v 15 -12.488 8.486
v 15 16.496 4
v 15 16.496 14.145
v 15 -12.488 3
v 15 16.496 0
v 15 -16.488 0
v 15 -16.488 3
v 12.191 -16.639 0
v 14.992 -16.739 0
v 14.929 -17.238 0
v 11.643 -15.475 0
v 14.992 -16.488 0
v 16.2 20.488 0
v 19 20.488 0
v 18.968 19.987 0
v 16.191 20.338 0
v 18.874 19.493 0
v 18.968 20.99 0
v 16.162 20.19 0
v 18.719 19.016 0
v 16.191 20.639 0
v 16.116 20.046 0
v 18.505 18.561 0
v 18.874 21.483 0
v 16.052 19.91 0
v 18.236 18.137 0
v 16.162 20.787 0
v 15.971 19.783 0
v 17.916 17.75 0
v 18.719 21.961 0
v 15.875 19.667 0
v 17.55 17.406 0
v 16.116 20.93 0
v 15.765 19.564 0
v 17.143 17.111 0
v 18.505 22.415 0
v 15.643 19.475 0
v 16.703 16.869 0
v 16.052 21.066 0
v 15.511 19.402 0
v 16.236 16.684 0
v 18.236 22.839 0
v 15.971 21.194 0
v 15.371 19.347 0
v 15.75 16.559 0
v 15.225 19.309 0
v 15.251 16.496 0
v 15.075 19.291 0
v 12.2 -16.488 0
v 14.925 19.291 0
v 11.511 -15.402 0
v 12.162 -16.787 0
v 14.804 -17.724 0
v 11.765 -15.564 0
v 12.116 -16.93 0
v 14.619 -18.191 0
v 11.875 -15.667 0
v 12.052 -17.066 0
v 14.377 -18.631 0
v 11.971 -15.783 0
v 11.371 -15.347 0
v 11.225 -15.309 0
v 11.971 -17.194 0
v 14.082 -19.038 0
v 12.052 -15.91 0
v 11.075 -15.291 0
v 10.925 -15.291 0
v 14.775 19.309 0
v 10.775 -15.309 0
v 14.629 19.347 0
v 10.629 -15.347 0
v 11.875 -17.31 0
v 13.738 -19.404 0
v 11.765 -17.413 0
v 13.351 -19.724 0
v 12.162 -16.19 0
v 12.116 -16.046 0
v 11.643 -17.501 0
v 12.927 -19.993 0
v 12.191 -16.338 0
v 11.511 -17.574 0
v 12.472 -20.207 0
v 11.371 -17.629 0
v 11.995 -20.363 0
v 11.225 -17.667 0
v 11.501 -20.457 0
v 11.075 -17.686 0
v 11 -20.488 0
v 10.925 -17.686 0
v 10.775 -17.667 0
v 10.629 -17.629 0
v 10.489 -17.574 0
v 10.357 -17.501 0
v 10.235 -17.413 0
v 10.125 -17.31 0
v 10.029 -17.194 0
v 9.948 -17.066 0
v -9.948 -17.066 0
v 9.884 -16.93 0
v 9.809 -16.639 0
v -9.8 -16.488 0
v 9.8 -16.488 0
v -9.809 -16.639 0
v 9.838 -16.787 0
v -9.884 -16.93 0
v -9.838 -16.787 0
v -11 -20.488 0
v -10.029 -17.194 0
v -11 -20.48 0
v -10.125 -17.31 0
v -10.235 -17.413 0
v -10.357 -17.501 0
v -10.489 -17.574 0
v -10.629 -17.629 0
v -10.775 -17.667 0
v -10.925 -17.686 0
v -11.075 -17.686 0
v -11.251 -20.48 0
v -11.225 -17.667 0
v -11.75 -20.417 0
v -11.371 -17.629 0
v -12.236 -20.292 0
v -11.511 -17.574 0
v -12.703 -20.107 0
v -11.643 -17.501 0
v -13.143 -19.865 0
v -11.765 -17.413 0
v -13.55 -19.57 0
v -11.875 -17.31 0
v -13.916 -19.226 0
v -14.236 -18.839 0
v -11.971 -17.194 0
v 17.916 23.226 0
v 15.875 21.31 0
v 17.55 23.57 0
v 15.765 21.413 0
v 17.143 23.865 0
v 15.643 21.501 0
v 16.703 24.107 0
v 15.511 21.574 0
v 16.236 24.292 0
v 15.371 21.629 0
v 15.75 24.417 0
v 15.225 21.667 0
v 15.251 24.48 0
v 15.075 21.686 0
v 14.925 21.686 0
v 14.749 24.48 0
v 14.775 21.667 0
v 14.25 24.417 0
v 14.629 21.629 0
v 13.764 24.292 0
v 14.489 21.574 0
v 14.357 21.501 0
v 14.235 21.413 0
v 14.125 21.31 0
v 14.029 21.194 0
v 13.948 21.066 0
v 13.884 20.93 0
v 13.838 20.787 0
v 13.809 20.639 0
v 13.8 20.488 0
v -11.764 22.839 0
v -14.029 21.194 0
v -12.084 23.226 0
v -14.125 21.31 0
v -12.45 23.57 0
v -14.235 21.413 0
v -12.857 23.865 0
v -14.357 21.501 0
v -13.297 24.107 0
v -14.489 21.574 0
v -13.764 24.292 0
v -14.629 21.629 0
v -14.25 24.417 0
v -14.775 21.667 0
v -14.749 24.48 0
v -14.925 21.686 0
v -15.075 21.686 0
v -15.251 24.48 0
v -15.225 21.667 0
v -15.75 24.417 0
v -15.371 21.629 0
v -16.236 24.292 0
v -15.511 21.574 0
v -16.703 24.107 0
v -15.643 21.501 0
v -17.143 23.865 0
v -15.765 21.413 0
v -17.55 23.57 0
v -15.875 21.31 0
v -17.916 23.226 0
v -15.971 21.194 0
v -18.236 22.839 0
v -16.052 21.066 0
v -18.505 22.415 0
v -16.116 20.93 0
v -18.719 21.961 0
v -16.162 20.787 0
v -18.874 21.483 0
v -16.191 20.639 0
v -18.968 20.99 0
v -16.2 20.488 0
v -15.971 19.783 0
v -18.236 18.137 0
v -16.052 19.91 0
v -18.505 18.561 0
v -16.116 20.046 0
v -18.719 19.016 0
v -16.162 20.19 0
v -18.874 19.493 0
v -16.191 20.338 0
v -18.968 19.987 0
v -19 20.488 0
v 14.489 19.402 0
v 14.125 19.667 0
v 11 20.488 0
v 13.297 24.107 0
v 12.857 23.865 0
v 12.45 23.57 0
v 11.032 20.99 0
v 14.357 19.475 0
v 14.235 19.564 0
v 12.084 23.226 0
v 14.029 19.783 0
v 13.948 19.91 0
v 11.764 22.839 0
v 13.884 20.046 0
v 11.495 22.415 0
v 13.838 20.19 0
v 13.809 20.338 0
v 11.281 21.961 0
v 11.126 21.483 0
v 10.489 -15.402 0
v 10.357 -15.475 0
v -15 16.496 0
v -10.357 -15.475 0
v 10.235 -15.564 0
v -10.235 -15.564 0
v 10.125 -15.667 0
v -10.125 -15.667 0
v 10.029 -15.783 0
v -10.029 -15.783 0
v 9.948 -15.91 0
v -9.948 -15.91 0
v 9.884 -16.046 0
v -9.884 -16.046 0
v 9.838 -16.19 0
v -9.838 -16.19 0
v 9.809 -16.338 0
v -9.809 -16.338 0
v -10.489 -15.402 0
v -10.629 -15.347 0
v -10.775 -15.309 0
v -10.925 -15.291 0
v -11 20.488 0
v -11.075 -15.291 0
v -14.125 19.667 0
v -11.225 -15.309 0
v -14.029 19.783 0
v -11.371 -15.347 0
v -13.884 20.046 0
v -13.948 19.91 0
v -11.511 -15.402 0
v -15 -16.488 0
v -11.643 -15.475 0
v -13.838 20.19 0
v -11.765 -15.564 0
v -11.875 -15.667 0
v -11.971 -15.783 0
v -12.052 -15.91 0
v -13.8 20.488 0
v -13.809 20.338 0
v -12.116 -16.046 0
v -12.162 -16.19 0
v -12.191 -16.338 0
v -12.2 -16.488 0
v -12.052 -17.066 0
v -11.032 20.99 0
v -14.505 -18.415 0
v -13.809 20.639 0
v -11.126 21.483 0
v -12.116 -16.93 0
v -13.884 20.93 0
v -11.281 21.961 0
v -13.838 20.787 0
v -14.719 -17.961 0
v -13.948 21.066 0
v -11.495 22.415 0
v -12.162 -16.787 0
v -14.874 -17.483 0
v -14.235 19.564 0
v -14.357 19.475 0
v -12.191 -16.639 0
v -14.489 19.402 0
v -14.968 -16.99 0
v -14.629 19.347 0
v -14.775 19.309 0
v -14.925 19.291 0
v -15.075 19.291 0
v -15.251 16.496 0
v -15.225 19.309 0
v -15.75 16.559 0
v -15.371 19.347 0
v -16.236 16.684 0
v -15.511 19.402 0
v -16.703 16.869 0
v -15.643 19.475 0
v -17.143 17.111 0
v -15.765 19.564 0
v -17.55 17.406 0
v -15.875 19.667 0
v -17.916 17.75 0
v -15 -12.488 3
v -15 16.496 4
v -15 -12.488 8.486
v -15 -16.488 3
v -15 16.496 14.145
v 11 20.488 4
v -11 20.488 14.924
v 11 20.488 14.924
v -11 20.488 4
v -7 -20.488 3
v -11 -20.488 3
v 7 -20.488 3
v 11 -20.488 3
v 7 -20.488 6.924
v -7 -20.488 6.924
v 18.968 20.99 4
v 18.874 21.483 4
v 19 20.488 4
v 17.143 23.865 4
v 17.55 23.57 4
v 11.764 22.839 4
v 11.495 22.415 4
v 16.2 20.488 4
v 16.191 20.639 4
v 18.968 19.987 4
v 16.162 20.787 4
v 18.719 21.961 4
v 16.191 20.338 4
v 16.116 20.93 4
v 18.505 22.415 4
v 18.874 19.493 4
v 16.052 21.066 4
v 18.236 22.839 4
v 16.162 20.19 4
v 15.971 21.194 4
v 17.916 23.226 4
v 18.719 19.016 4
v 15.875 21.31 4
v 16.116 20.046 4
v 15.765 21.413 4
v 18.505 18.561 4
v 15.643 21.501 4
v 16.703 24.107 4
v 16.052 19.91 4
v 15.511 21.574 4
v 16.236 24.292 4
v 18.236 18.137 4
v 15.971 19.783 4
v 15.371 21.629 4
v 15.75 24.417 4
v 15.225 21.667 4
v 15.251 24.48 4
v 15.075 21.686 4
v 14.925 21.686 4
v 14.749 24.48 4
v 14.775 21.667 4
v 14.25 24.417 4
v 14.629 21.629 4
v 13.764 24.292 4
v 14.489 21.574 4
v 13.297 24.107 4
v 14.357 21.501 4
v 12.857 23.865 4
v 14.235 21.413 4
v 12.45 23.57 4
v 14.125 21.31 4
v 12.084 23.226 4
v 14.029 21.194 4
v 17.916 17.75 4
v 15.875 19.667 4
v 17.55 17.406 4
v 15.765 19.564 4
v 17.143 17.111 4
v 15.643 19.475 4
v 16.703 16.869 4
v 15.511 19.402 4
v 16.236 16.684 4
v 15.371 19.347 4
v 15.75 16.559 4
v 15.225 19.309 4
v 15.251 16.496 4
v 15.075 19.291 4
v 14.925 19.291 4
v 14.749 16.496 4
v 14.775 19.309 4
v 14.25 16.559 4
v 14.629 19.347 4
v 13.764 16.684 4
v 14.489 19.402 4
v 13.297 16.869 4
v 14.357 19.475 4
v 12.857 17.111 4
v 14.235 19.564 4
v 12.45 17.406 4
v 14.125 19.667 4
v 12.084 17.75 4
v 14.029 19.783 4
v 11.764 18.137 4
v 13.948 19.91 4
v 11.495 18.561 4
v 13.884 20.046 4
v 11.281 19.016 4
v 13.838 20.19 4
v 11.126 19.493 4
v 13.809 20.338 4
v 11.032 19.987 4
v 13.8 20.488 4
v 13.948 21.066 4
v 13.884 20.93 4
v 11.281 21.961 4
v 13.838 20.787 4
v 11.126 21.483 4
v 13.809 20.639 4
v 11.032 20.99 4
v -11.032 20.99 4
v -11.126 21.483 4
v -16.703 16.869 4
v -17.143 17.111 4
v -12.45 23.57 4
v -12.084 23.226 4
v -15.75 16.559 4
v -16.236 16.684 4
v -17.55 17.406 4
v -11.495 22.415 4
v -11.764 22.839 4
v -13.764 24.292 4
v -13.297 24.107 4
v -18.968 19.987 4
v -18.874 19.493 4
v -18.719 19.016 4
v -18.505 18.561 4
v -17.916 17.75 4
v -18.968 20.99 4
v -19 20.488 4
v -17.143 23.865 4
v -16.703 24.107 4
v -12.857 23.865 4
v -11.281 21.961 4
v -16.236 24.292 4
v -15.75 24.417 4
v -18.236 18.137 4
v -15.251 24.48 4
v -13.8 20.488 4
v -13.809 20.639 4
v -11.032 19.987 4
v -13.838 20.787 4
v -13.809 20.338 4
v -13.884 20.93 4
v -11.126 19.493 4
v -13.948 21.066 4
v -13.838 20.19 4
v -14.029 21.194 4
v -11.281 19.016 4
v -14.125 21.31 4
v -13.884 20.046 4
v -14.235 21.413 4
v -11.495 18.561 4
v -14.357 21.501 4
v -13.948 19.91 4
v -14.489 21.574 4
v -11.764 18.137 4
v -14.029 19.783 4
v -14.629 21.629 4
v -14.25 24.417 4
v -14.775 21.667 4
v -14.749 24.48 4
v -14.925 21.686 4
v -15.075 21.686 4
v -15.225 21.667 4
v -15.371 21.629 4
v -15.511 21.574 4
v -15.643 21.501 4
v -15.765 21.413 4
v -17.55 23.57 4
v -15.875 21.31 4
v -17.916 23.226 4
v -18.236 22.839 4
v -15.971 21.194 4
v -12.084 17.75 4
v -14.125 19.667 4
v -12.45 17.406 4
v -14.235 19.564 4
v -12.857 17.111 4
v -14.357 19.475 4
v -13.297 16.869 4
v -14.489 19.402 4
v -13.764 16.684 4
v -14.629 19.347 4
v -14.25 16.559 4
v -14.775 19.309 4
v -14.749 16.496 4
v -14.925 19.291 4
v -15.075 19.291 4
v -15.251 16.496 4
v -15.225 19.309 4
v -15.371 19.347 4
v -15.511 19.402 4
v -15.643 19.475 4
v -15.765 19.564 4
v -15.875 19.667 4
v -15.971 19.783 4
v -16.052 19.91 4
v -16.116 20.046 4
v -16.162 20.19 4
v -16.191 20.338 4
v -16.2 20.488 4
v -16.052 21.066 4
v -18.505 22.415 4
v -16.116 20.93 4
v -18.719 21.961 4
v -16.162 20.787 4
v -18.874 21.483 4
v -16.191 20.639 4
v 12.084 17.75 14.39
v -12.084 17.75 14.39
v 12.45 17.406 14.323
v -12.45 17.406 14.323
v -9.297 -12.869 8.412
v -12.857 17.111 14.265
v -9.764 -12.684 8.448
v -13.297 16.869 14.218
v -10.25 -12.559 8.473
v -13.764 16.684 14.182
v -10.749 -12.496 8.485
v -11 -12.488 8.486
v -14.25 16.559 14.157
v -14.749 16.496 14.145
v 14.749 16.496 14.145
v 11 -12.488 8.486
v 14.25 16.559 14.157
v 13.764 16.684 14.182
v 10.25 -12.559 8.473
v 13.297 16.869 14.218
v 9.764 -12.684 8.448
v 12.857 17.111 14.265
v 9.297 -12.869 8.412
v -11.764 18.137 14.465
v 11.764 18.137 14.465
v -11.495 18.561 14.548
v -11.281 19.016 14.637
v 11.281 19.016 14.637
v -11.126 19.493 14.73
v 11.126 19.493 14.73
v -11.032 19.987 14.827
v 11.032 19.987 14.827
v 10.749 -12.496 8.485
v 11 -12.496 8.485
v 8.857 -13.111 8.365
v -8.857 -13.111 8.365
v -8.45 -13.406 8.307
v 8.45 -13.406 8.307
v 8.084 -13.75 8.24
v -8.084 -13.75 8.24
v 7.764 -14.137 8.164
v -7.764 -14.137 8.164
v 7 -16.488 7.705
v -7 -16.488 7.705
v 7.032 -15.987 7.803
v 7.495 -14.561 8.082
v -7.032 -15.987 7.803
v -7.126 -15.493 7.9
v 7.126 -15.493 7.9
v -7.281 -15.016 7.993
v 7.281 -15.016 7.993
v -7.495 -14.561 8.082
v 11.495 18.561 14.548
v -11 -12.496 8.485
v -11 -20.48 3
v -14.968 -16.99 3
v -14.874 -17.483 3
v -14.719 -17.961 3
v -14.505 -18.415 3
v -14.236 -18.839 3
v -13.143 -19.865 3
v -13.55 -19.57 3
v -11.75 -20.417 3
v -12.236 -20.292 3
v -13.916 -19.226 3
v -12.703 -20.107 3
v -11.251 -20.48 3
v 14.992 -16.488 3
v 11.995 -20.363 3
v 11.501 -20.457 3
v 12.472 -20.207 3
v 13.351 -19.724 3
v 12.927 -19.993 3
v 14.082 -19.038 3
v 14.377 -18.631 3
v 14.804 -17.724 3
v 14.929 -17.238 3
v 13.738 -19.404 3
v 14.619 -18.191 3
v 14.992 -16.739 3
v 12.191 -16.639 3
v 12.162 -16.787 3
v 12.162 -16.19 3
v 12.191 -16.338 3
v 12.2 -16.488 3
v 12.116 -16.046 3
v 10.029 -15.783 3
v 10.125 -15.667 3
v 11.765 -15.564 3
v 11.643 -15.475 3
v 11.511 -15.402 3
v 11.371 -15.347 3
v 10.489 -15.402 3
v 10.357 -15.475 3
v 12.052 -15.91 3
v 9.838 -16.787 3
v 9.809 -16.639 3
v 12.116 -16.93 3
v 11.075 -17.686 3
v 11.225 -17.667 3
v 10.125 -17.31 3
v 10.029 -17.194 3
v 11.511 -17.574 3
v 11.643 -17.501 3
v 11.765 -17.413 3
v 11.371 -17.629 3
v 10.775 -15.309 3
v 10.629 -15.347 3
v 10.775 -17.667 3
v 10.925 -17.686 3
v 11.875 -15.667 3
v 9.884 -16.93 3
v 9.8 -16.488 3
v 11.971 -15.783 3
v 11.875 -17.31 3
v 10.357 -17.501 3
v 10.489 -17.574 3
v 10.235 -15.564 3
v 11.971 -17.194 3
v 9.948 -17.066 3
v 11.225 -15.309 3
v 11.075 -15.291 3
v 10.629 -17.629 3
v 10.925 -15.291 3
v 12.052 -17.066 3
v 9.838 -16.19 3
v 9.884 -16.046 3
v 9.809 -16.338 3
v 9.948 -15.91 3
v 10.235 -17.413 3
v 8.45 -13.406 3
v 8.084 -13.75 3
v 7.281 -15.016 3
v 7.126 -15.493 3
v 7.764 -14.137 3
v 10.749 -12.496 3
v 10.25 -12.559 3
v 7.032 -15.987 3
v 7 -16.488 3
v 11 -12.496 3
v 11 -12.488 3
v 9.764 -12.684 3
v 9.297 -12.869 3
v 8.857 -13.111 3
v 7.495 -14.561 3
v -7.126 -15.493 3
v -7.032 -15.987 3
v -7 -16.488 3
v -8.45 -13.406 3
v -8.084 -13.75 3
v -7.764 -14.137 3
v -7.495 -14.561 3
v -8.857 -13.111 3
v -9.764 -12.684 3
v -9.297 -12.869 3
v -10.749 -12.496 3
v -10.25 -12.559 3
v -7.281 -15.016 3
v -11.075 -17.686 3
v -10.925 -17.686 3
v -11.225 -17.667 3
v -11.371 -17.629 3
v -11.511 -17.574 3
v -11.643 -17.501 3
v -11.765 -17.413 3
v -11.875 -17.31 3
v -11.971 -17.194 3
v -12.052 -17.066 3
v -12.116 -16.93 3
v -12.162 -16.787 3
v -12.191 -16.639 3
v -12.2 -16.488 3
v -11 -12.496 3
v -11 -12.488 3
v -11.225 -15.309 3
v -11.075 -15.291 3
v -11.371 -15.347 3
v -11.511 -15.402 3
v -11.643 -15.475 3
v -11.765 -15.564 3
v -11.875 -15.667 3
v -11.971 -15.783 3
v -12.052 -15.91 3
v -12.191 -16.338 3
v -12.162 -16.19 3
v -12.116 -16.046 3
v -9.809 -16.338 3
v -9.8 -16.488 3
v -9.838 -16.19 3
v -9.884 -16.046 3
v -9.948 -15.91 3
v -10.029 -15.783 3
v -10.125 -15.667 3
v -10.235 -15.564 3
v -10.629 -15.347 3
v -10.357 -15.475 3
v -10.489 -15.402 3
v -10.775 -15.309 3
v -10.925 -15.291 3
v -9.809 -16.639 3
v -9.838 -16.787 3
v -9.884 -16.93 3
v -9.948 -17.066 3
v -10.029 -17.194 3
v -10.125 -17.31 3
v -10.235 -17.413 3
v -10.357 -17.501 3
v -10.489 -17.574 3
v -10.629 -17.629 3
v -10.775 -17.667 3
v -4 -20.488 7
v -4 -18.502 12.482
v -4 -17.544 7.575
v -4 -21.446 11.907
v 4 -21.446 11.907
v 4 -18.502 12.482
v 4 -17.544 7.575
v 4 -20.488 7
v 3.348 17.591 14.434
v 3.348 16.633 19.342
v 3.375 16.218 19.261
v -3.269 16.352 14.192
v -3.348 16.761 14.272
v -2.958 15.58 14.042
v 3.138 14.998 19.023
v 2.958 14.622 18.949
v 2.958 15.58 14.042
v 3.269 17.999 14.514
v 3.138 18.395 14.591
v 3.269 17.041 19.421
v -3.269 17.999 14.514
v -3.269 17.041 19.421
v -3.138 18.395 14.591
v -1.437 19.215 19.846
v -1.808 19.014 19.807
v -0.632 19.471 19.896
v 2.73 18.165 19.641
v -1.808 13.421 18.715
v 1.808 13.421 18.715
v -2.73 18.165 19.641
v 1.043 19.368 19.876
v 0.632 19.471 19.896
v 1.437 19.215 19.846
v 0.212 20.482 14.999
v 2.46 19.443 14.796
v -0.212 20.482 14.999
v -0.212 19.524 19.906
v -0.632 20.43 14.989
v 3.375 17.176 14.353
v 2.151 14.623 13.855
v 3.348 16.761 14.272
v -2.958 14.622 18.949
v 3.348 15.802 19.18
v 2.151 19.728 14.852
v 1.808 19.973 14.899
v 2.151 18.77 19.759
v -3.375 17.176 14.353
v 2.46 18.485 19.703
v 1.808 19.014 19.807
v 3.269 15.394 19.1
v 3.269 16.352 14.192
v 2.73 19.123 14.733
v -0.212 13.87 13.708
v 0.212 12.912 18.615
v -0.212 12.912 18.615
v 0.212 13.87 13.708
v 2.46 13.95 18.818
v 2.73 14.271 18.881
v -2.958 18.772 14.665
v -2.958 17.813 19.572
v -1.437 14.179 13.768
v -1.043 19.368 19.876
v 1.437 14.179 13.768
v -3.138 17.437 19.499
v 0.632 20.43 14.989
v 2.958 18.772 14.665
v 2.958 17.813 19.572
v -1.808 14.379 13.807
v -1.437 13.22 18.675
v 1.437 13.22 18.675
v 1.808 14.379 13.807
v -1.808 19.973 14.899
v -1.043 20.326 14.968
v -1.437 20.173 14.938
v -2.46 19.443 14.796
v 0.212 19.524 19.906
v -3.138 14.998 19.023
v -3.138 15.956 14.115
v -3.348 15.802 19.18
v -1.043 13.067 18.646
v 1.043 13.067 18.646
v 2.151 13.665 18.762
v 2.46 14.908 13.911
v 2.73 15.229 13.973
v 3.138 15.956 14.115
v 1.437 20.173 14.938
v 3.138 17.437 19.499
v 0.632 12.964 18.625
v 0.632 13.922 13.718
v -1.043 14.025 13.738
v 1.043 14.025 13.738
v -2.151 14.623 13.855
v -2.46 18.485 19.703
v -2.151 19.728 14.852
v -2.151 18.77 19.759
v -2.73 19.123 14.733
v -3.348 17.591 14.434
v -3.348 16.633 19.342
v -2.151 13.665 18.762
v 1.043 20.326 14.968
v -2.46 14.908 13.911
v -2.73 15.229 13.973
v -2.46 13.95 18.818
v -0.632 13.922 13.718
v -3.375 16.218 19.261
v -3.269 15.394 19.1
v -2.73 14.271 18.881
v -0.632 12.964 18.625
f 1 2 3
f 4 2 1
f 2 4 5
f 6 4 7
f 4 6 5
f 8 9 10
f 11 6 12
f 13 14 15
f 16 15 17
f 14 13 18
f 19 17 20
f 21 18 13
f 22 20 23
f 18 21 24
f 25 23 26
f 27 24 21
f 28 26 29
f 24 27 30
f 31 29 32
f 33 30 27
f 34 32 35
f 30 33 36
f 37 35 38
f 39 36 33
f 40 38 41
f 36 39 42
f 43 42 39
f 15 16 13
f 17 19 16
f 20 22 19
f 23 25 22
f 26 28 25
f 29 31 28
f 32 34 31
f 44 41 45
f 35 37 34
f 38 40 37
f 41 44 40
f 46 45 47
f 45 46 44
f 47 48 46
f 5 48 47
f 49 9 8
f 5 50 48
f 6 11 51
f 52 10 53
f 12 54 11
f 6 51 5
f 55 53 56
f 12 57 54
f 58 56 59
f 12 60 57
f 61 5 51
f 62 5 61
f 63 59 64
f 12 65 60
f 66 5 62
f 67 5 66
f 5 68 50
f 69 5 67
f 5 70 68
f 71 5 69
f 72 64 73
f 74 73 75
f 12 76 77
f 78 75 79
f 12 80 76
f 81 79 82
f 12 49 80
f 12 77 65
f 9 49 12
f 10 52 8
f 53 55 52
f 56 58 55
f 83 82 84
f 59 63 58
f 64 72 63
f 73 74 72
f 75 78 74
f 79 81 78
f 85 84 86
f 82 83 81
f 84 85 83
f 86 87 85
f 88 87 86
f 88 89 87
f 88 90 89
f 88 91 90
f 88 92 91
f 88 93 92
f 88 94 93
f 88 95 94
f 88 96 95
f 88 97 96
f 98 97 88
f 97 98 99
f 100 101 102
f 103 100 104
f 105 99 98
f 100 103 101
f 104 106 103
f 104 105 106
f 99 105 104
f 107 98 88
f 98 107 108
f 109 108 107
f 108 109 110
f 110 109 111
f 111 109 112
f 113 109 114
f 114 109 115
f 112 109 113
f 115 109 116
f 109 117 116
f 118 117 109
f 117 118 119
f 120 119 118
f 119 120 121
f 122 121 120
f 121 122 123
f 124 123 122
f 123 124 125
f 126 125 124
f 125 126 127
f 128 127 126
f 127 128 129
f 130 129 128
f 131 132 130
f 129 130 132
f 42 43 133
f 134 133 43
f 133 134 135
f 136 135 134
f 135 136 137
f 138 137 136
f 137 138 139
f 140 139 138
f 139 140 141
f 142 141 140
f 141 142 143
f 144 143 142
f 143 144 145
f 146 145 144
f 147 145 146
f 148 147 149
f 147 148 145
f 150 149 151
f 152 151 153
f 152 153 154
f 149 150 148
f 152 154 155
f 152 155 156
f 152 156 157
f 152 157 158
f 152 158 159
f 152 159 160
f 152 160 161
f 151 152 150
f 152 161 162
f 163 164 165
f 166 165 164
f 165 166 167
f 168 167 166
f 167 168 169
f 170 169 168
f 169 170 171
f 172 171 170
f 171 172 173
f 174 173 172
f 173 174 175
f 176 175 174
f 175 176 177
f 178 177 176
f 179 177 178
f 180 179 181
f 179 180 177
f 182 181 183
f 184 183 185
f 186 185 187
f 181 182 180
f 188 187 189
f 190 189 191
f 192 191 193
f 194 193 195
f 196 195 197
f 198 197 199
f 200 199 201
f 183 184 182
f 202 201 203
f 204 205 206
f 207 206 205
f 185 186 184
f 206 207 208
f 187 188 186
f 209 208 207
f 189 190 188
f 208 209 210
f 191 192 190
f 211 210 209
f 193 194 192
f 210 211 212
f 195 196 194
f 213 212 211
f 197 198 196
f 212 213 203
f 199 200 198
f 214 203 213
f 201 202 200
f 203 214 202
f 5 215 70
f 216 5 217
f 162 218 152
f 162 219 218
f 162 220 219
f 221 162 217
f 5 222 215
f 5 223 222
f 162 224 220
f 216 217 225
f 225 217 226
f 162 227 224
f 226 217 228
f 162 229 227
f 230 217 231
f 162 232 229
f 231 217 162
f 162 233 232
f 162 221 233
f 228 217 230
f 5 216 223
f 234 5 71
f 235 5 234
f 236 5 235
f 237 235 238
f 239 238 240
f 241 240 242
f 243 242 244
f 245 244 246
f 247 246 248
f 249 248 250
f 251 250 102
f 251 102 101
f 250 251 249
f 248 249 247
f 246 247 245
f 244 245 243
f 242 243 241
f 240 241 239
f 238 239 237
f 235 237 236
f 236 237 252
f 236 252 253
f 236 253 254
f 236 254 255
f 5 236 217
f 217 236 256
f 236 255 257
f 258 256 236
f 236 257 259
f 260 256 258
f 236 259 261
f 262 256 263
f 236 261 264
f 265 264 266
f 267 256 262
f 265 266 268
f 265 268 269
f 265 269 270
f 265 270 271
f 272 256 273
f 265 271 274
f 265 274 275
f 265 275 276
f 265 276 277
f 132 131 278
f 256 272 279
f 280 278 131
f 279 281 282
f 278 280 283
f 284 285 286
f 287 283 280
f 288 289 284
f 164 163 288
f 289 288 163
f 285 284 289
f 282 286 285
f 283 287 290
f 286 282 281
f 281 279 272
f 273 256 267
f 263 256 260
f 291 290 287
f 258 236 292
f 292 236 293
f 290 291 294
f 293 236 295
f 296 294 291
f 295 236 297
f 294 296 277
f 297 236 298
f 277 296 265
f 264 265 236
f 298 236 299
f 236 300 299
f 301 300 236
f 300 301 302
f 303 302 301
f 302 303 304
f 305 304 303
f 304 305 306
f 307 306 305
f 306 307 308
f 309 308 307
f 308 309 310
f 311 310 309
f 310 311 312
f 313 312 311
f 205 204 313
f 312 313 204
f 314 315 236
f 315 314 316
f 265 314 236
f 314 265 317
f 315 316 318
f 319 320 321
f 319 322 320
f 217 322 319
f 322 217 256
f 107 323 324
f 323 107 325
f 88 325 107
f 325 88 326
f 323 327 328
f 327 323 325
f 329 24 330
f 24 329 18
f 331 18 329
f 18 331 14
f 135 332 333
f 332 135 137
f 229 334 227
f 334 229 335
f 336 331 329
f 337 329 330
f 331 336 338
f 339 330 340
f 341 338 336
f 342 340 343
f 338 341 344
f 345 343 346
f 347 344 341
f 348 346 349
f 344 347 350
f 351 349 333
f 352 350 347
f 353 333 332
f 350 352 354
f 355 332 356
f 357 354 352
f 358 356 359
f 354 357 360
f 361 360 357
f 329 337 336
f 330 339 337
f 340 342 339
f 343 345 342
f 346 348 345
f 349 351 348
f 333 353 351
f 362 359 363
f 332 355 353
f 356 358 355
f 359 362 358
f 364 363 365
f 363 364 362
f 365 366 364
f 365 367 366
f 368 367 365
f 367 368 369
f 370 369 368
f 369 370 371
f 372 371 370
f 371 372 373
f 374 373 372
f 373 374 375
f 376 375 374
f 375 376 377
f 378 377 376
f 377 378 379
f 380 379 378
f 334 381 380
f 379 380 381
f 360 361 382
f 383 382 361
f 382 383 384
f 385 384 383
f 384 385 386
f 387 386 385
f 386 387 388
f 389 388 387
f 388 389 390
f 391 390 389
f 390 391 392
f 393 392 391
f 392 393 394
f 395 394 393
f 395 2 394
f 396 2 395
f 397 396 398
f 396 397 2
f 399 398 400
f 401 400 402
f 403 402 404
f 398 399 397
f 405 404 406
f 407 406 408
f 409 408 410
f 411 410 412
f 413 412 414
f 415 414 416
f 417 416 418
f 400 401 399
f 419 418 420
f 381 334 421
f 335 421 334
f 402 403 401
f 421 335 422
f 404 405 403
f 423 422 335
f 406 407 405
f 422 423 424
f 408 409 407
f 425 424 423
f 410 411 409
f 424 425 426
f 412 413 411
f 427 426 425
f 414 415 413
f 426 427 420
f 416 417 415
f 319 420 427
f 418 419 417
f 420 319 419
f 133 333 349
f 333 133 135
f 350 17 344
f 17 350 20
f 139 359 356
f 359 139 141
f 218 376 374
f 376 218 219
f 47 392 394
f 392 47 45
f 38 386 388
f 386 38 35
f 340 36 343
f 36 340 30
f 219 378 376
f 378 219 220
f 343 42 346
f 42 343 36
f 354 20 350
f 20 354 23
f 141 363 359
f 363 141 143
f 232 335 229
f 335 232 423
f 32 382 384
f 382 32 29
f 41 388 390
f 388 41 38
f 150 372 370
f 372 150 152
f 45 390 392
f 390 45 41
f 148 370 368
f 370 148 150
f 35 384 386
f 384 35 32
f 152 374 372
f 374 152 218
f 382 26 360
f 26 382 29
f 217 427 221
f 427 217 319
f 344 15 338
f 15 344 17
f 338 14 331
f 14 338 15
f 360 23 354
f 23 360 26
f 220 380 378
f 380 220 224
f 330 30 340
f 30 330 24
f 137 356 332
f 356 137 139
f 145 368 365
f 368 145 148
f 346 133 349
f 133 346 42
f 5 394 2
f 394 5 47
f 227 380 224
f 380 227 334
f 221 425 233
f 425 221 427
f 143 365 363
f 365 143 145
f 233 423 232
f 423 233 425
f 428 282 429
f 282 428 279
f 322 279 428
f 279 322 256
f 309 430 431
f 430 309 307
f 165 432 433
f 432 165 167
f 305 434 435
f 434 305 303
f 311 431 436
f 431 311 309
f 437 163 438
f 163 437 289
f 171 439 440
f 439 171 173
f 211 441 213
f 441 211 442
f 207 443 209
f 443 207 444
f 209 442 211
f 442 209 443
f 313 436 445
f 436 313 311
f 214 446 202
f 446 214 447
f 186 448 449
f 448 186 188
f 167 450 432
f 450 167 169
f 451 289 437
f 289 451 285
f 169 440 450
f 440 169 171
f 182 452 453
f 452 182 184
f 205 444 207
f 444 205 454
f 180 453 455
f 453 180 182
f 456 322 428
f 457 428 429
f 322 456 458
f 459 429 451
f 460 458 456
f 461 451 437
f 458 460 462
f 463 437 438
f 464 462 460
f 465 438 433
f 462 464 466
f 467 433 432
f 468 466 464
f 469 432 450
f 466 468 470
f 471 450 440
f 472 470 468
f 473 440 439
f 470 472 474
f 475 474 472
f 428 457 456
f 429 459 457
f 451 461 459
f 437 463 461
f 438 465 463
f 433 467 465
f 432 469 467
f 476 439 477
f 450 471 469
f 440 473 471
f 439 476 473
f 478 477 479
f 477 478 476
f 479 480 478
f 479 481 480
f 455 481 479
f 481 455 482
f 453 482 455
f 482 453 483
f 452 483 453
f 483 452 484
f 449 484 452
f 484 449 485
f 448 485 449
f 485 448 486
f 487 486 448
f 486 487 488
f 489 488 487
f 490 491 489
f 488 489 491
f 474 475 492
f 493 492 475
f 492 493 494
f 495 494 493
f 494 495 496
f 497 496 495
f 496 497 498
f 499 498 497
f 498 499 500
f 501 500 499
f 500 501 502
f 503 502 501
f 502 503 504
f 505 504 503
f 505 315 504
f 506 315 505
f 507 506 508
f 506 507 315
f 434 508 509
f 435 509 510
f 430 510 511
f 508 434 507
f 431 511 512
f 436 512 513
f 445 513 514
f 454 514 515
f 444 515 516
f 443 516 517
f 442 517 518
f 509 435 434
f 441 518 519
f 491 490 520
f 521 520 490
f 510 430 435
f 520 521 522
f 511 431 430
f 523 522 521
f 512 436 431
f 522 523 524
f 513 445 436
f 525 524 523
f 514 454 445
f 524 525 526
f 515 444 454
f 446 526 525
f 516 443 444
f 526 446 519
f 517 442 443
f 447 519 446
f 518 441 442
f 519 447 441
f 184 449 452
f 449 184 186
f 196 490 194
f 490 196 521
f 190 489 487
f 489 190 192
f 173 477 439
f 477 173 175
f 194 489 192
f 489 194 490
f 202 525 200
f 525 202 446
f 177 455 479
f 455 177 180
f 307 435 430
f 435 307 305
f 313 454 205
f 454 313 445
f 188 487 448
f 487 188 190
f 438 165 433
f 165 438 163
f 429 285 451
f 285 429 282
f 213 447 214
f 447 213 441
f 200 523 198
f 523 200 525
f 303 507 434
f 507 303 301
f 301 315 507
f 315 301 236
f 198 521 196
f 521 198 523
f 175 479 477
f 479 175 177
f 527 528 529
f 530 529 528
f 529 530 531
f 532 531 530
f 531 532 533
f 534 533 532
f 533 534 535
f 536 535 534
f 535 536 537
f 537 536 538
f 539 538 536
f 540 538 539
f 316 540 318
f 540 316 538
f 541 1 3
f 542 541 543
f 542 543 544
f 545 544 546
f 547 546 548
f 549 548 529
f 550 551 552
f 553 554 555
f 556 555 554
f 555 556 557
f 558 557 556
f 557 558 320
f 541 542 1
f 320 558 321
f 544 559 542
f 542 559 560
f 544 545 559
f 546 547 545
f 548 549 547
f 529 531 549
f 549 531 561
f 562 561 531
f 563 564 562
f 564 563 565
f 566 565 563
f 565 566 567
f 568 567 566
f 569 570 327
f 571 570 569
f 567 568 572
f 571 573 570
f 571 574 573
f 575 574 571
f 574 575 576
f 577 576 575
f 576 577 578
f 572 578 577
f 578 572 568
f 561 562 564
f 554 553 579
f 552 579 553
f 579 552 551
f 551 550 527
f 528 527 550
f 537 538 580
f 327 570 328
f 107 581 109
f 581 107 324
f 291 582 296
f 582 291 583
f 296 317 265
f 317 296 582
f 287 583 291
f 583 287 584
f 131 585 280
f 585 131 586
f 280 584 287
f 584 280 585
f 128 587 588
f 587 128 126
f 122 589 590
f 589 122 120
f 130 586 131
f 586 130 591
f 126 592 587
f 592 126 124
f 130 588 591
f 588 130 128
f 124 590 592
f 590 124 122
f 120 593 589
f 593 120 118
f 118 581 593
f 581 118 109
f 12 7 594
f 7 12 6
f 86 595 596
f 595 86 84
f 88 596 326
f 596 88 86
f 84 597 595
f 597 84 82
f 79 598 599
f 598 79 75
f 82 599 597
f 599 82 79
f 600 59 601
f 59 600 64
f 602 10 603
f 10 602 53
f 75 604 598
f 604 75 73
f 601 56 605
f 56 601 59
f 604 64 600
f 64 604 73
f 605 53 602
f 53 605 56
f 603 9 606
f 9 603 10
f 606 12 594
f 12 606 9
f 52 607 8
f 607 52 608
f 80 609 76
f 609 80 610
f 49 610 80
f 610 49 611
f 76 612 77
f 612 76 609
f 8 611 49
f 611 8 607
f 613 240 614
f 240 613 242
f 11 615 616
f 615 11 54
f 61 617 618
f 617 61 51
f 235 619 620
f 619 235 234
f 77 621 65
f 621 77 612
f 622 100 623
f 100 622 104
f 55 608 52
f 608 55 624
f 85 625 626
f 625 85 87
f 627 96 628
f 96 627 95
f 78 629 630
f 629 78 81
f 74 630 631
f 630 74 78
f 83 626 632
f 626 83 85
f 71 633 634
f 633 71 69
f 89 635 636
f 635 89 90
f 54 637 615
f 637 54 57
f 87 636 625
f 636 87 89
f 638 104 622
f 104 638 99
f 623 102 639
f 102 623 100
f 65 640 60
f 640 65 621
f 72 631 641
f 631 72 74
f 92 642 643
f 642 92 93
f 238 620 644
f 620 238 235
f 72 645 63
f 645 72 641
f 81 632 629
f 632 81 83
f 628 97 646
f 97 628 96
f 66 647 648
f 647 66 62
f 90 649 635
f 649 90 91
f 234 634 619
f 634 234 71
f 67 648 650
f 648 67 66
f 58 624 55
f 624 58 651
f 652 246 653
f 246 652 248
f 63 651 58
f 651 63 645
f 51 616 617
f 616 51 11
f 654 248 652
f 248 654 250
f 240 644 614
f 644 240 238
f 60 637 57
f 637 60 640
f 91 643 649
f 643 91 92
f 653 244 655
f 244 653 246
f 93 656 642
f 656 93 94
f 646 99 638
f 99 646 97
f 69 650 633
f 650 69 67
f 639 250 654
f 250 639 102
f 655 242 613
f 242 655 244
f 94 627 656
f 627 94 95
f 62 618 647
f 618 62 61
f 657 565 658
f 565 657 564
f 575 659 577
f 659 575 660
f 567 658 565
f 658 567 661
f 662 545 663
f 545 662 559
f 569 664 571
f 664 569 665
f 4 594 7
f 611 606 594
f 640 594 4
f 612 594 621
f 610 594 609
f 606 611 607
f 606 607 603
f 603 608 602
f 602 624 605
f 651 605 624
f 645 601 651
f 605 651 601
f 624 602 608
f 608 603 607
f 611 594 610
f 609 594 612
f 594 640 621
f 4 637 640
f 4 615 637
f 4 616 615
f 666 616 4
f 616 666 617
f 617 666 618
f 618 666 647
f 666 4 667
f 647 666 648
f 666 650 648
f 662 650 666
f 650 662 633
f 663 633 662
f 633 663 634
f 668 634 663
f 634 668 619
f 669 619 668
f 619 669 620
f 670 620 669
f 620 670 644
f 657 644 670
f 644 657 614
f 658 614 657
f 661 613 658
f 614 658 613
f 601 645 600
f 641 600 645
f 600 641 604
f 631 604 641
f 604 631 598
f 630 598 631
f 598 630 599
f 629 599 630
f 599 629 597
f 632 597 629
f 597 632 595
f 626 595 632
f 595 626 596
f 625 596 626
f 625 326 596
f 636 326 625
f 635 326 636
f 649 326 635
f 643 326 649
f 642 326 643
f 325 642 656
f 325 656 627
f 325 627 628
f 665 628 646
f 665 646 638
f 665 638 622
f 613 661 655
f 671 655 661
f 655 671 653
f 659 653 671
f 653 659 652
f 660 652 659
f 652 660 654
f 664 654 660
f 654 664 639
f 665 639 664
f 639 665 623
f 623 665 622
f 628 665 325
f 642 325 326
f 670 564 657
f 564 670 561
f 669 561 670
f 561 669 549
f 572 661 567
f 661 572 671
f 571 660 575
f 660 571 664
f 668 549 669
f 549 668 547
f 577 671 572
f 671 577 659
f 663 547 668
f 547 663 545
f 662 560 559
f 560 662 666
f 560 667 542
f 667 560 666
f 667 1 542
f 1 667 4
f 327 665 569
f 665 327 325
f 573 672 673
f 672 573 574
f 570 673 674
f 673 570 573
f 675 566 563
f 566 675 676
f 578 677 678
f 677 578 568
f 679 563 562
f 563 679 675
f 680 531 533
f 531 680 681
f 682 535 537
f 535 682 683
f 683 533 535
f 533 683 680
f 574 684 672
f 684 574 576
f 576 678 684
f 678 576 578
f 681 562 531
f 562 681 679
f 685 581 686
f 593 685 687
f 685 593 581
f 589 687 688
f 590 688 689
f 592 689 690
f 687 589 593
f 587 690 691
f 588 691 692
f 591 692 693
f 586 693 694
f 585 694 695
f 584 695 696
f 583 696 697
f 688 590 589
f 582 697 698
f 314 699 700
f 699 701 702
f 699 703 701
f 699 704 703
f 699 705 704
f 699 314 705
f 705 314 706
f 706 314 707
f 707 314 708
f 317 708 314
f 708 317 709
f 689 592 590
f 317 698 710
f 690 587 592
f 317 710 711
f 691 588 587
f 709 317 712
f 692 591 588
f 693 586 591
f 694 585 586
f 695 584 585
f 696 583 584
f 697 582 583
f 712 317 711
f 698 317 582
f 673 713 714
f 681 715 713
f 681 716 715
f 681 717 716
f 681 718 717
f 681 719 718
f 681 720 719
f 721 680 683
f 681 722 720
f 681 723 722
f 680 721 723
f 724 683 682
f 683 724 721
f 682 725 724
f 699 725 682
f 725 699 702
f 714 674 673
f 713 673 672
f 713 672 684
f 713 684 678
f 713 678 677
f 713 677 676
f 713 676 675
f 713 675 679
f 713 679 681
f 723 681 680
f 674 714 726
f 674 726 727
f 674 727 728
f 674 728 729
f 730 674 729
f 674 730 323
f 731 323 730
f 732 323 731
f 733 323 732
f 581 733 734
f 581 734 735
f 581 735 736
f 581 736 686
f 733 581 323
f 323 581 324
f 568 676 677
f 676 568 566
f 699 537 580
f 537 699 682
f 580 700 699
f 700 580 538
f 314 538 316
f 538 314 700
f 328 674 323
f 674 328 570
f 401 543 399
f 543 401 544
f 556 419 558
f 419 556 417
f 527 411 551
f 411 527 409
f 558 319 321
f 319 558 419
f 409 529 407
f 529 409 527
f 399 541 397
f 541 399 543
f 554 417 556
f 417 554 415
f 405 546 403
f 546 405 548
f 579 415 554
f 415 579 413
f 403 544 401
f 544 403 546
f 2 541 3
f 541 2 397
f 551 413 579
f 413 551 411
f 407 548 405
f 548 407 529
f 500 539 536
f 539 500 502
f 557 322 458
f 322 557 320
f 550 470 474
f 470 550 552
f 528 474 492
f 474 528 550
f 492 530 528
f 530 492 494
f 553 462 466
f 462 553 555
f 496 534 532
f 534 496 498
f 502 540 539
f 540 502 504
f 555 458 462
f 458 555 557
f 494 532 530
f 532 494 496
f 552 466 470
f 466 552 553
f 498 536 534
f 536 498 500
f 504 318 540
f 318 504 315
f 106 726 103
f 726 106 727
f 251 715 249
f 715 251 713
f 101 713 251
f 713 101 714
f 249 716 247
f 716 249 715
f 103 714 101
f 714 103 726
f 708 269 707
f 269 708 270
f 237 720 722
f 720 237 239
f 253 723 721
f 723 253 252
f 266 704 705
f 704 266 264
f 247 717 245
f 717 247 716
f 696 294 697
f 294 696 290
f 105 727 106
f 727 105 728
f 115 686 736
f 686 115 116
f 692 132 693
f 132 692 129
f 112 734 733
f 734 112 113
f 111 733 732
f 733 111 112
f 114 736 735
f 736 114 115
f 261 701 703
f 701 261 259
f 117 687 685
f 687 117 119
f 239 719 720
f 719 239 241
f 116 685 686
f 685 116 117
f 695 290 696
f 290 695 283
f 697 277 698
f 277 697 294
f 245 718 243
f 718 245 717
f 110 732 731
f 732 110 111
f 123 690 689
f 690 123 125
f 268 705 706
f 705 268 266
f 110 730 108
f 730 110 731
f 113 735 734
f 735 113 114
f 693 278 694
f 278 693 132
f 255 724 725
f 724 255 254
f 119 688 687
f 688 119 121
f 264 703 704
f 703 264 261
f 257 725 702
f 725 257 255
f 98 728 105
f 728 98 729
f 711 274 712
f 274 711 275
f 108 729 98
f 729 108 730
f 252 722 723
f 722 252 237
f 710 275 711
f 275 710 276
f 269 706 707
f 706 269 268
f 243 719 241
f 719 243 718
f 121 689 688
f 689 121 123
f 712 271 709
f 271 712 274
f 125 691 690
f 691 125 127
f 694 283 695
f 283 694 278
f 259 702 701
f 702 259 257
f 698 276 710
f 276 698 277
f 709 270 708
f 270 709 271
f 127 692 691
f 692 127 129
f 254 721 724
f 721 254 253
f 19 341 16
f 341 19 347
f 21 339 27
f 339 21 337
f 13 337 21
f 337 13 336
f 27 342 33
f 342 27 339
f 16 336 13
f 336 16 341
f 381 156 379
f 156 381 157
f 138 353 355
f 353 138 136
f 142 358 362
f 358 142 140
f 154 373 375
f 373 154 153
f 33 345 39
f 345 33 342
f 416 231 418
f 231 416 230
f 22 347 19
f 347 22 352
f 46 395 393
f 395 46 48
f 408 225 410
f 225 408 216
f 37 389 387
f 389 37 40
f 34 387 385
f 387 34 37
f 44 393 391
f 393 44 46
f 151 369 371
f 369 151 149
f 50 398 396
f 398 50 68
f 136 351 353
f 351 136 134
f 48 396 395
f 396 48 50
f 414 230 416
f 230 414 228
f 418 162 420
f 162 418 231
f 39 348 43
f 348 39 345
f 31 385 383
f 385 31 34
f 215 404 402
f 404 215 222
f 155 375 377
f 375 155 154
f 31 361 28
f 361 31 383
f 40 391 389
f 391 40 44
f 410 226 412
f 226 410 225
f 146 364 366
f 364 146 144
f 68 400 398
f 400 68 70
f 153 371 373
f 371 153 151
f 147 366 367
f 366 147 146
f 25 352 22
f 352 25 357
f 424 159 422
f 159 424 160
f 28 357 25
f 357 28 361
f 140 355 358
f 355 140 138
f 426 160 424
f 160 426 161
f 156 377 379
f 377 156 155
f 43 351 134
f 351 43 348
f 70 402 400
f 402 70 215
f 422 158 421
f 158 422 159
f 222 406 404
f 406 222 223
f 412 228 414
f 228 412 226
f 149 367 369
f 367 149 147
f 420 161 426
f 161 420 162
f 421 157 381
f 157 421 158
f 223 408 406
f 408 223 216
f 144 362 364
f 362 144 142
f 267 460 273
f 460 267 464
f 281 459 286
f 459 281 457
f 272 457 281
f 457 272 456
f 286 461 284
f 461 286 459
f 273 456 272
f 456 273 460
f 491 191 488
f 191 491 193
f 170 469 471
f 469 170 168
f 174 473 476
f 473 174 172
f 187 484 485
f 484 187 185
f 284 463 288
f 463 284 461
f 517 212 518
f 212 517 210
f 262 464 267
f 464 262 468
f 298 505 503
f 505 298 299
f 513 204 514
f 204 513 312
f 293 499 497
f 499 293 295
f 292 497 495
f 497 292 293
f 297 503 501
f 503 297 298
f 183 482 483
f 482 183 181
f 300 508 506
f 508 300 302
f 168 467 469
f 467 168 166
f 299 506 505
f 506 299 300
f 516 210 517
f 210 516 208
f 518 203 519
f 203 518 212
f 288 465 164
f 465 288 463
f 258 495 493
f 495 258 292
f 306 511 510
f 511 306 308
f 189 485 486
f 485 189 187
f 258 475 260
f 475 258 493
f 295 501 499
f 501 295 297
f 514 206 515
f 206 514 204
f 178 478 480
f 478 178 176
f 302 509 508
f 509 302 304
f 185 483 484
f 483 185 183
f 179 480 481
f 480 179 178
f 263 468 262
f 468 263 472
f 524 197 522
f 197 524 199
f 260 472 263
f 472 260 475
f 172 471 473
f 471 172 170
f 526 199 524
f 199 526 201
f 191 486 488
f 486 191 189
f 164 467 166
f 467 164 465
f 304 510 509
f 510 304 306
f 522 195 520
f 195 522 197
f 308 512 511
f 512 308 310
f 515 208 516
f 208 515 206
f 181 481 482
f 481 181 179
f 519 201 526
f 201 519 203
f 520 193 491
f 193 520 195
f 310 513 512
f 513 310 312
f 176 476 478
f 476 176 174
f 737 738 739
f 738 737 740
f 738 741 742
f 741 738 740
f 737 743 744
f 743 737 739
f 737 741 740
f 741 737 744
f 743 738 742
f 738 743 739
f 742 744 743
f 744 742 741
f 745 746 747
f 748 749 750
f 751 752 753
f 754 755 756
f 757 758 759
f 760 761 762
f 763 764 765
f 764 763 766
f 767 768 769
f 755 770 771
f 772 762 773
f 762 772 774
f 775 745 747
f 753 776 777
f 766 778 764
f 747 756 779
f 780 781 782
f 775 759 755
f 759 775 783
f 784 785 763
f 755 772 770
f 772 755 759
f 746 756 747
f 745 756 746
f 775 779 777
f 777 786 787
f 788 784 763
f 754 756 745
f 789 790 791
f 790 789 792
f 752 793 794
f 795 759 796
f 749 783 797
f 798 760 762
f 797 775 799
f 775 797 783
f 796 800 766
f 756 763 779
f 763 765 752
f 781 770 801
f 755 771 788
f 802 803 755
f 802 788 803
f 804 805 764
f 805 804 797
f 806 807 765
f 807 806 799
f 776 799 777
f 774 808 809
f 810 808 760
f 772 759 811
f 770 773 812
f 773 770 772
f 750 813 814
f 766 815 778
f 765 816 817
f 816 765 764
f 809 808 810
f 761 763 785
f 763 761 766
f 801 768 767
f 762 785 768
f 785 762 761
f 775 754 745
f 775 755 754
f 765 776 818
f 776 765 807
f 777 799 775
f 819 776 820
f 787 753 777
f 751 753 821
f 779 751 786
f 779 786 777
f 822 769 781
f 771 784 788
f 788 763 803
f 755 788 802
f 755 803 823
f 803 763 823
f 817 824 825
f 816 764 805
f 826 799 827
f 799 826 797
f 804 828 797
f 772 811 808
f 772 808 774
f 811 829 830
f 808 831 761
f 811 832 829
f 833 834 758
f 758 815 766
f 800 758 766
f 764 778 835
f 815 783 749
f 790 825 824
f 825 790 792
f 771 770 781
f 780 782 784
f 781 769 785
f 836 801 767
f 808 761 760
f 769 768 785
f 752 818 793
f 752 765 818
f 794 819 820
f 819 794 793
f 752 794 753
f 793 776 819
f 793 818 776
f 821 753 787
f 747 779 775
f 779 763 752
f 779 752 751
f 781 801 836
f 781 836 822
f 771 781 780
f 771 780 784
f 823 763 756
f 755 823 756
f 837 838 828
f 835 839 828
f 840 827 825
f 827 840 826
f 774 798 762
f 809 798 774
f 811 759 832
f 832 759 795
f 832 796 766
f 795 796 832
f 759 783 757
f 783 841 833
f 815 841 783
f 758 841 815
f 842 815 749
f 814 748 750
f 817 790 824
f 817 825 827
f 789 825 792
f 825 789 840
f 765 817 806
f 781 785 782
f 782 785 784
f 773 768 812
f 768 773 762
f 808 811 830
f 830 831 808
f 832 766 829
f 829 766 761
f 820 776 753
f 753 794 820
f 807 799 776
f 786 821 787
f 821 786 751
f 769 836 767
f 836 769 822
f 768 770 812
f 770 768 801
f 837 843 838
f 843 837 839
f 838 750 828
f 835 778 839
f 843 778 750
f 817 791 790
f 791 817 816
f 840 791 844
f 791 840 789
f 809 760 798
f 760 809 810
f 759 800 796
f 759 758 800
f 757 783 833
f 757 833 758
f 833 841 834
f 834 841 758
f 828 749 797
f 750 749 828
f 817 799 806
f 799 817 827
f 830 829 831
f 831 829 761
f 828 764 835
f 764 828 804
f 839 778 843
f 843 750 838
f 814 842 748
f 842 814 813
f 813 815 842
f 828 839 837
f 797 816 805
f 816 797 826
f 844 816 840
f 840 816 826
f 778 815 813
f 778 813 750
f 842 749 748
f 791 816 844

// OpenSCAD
// Bike Light Spacer

$fn = 50;

// base_flat - this is the flat width on the bike seat post
// base wall thick = minium thickness - not used?
// base width = flat + 4mm (each side) overhang
base_flat = 22;
base_wall_thick = 10;
base_width = base_flat + (4 * 2);

// clears
seat_adj_dia = 6.75;
post_overhang = 3;

// base distance = distance beteen the two inserts on the 
// min base height = 3 + stack height of the screw & washer
base_min_base_height = 3 + 4;
base_distance = 32;
base_hypot = base_distance + seat_adj_dia + post_overhang;
base_opposite = 8;
base_adjacent = sqrt(pow(base_hypot,2) - pow(base_opposite, 2));
base_angle = asin(base_opposite/ base_hypot);
echo("base tilt ange: ", base_angle);
echo("base dimensions:");
echo("         vertical:", base_adjacent);
echo("       horizontal:", base_opposite);
echo("   mating surface:", base_hypot);
echo("            width:", base_width);

// clip inset
clip_width = 22;
clip_length = 41;
clip_depth = 10;



// what is the z-translate distance to lift the subtraction square?
// zh = distance the rotation will be BELOW the original - hypoteneuse
wedge_zh = (base_hypot * 0.5) * sin(base_angle);
wedge_z =  (wedge_zh) / cos(base_angle);

echo(" wedge subtract z-translate:", wedge_zh, wedge_z);

// top inset dimensions
inset_depth = 5;
inset_width = 8;
inset_thick = 3;

// top inset
// you KNOW the thick part is exactly 3 mm
//    so translate is simple, raise 3 mm on z axis
//    -- subtracted 0.1 on z axis to cover rounding errors
translate([-(inset_width/2),-(base_adjacent/2),base_min_base_height])
rotate([base_angle,0,0])
cube([inset_width, inset_thick, inset_depth]);

// seat adj inset
// diameter defined above (seat_adj_dia)
seat_adj_depth = 5;

// seat post surface == base_hypot
// - point that is inset radius from edge
// -- subtracted 0.1 on z axis to cover rounding errors
seat_post_inset_hypot = (base_hypot/2) - (seat_adj_dia/2);
seat_post_inset_z = sin(base_angle) * (base_hypot/2 + seat_post_inset_hypot) + base_min_base_height;
seat_post_inset_y = cos(base_angle) * (base_hypot/2 + seat_post_inset_hypot) - (base_adjacent/2);

echo ("seat post inset:");
echo ("   hypot:", seat_post_inset_hypot);
echo ("       z:", seat_post_inset_z);
echo ("       y:", seat_post_inset_y);

translate([0,seat_post_inset_y,seat_post_inset_z])
rotate([base_angle,0,0])
cylinder(h = seat_adj_depth, r = seat_adj_dia/2);

  

// main base - like a wedge
difference () {
    {
        //translate([0,0,(base_opposite + 3)/2])
        difference() {
            {
            union () {
                // core base
                translate([-base_width/2, -base_adjacent/2,0])
                cube ( [base_width, base_adjacent, base_opposite + base_min_base_height]); 
                    
                // bottom mounting posts
                translate ([base_width/2 ,base_adjacent/2,0])
                cylinder(r = 4, h = 4);
                    
                translate ([-(base_width/2 ),base_adjacent/2,0])
                cylinder(r = 4, h = 4); 
                }
            }
            {
            // subtract out top angle
            //   make it wider and longer + 5 (in x & y dimensions)
            //   it doesn't have to be thicker then base_opposite
            // -- minimum thickness = 3
            echo("wedge translate z:", base_wall_thick, wedge_z);
            //translate([0, 0, base_width + base_wall_thick/2 + wedge_z])
            translate([0,0,base_opposite + base_min_base_height])
            rotate([base_angle,0, 0])
            cube ( [ base_width + 5, base_adjacent + 5, base_opposite], center = true);
            }
        }
    }
    {            

        

    
 
    

        
    // corner chanfer
    // chanfer = 4 mm radius
    // ** remember that variables are immutable
    //    you can't re-use, so use cx1 and cx2
    cx1 = base_width/2;
    cy1 = base_adjacent/2;
  
    // opposite corner
    rotate ([0,0,180])
    translate([(cx1 - 4),(cy1 - 4),0])
    difference () {
    cube ([ 4,4,40], center = false);
    cylinder (r = 4, h = 40);    
    }    
    
    // opposite pair, use new variables
    cx2 = base_width/2;
    cy2 = base_adjacent/2;
    translate([(cx2 - 4),(-cy2 + 4),0])
    rotate ([0,0,270])
    difference () {
    cube ([ 4,4,40], center = false);
    cylinder (r = 4, h = 40);    
    }   

    // mounting holes
    mounting_hole_centers = [
        [(base_width/2 - 4), -(base_adjacent/2 -4), 0],
        [-(base_width/2 - 4), -(base_adjacent/2 -4), 0],
        [base_width/2 ,base_adjacent/2,0],
        [-(base_width/2 ),base_adjacent/2,0]
        ];
        
    for (cntr = mounting_hole_centers) {
        translate(cntr)
        cylinder (r = 1.2, h = 20);
    
    // top mounting post - recess
    translate ([(base_width/2 - 4), -(base_adjacent/2 - 4),3])
    cylinder(r = 4, h = clip_depth);
    translate ([(base_width/2 - 2), -(base_adjacent/2 - 4),10])
    cube ([4,8,14], center = true);
    translate ([(base_width/2 - 4), -(base_adjacent/2 - 2),10])
    cube ([8,4,14], center = true);
        
    translate ([-(base_width/2 - 4), -(base_adjacent/2 -4),3])
    cylinder(r = 4, h = clip_depth); 
    translate ([-(base_width/2 - 2), -(base_adjacent/2 - 4),10])
    cube ([4,8,14], center = true); 
    translate ([-(base_width/2 - 4), -(base_adjacent/2 - 2),10])
    cube ([8,4,14], center = true);     
        
    // bottom mounting posts - recess
    translate ([base_width/2 ,base_adjacent/2,4])
    cylinder(r = 4, h = 20);
        
    translate ([-(base_width/2 ),base_adjacent/2,4])
    cylinder(r = 4, h = 20);     
    }
    
}    
}
